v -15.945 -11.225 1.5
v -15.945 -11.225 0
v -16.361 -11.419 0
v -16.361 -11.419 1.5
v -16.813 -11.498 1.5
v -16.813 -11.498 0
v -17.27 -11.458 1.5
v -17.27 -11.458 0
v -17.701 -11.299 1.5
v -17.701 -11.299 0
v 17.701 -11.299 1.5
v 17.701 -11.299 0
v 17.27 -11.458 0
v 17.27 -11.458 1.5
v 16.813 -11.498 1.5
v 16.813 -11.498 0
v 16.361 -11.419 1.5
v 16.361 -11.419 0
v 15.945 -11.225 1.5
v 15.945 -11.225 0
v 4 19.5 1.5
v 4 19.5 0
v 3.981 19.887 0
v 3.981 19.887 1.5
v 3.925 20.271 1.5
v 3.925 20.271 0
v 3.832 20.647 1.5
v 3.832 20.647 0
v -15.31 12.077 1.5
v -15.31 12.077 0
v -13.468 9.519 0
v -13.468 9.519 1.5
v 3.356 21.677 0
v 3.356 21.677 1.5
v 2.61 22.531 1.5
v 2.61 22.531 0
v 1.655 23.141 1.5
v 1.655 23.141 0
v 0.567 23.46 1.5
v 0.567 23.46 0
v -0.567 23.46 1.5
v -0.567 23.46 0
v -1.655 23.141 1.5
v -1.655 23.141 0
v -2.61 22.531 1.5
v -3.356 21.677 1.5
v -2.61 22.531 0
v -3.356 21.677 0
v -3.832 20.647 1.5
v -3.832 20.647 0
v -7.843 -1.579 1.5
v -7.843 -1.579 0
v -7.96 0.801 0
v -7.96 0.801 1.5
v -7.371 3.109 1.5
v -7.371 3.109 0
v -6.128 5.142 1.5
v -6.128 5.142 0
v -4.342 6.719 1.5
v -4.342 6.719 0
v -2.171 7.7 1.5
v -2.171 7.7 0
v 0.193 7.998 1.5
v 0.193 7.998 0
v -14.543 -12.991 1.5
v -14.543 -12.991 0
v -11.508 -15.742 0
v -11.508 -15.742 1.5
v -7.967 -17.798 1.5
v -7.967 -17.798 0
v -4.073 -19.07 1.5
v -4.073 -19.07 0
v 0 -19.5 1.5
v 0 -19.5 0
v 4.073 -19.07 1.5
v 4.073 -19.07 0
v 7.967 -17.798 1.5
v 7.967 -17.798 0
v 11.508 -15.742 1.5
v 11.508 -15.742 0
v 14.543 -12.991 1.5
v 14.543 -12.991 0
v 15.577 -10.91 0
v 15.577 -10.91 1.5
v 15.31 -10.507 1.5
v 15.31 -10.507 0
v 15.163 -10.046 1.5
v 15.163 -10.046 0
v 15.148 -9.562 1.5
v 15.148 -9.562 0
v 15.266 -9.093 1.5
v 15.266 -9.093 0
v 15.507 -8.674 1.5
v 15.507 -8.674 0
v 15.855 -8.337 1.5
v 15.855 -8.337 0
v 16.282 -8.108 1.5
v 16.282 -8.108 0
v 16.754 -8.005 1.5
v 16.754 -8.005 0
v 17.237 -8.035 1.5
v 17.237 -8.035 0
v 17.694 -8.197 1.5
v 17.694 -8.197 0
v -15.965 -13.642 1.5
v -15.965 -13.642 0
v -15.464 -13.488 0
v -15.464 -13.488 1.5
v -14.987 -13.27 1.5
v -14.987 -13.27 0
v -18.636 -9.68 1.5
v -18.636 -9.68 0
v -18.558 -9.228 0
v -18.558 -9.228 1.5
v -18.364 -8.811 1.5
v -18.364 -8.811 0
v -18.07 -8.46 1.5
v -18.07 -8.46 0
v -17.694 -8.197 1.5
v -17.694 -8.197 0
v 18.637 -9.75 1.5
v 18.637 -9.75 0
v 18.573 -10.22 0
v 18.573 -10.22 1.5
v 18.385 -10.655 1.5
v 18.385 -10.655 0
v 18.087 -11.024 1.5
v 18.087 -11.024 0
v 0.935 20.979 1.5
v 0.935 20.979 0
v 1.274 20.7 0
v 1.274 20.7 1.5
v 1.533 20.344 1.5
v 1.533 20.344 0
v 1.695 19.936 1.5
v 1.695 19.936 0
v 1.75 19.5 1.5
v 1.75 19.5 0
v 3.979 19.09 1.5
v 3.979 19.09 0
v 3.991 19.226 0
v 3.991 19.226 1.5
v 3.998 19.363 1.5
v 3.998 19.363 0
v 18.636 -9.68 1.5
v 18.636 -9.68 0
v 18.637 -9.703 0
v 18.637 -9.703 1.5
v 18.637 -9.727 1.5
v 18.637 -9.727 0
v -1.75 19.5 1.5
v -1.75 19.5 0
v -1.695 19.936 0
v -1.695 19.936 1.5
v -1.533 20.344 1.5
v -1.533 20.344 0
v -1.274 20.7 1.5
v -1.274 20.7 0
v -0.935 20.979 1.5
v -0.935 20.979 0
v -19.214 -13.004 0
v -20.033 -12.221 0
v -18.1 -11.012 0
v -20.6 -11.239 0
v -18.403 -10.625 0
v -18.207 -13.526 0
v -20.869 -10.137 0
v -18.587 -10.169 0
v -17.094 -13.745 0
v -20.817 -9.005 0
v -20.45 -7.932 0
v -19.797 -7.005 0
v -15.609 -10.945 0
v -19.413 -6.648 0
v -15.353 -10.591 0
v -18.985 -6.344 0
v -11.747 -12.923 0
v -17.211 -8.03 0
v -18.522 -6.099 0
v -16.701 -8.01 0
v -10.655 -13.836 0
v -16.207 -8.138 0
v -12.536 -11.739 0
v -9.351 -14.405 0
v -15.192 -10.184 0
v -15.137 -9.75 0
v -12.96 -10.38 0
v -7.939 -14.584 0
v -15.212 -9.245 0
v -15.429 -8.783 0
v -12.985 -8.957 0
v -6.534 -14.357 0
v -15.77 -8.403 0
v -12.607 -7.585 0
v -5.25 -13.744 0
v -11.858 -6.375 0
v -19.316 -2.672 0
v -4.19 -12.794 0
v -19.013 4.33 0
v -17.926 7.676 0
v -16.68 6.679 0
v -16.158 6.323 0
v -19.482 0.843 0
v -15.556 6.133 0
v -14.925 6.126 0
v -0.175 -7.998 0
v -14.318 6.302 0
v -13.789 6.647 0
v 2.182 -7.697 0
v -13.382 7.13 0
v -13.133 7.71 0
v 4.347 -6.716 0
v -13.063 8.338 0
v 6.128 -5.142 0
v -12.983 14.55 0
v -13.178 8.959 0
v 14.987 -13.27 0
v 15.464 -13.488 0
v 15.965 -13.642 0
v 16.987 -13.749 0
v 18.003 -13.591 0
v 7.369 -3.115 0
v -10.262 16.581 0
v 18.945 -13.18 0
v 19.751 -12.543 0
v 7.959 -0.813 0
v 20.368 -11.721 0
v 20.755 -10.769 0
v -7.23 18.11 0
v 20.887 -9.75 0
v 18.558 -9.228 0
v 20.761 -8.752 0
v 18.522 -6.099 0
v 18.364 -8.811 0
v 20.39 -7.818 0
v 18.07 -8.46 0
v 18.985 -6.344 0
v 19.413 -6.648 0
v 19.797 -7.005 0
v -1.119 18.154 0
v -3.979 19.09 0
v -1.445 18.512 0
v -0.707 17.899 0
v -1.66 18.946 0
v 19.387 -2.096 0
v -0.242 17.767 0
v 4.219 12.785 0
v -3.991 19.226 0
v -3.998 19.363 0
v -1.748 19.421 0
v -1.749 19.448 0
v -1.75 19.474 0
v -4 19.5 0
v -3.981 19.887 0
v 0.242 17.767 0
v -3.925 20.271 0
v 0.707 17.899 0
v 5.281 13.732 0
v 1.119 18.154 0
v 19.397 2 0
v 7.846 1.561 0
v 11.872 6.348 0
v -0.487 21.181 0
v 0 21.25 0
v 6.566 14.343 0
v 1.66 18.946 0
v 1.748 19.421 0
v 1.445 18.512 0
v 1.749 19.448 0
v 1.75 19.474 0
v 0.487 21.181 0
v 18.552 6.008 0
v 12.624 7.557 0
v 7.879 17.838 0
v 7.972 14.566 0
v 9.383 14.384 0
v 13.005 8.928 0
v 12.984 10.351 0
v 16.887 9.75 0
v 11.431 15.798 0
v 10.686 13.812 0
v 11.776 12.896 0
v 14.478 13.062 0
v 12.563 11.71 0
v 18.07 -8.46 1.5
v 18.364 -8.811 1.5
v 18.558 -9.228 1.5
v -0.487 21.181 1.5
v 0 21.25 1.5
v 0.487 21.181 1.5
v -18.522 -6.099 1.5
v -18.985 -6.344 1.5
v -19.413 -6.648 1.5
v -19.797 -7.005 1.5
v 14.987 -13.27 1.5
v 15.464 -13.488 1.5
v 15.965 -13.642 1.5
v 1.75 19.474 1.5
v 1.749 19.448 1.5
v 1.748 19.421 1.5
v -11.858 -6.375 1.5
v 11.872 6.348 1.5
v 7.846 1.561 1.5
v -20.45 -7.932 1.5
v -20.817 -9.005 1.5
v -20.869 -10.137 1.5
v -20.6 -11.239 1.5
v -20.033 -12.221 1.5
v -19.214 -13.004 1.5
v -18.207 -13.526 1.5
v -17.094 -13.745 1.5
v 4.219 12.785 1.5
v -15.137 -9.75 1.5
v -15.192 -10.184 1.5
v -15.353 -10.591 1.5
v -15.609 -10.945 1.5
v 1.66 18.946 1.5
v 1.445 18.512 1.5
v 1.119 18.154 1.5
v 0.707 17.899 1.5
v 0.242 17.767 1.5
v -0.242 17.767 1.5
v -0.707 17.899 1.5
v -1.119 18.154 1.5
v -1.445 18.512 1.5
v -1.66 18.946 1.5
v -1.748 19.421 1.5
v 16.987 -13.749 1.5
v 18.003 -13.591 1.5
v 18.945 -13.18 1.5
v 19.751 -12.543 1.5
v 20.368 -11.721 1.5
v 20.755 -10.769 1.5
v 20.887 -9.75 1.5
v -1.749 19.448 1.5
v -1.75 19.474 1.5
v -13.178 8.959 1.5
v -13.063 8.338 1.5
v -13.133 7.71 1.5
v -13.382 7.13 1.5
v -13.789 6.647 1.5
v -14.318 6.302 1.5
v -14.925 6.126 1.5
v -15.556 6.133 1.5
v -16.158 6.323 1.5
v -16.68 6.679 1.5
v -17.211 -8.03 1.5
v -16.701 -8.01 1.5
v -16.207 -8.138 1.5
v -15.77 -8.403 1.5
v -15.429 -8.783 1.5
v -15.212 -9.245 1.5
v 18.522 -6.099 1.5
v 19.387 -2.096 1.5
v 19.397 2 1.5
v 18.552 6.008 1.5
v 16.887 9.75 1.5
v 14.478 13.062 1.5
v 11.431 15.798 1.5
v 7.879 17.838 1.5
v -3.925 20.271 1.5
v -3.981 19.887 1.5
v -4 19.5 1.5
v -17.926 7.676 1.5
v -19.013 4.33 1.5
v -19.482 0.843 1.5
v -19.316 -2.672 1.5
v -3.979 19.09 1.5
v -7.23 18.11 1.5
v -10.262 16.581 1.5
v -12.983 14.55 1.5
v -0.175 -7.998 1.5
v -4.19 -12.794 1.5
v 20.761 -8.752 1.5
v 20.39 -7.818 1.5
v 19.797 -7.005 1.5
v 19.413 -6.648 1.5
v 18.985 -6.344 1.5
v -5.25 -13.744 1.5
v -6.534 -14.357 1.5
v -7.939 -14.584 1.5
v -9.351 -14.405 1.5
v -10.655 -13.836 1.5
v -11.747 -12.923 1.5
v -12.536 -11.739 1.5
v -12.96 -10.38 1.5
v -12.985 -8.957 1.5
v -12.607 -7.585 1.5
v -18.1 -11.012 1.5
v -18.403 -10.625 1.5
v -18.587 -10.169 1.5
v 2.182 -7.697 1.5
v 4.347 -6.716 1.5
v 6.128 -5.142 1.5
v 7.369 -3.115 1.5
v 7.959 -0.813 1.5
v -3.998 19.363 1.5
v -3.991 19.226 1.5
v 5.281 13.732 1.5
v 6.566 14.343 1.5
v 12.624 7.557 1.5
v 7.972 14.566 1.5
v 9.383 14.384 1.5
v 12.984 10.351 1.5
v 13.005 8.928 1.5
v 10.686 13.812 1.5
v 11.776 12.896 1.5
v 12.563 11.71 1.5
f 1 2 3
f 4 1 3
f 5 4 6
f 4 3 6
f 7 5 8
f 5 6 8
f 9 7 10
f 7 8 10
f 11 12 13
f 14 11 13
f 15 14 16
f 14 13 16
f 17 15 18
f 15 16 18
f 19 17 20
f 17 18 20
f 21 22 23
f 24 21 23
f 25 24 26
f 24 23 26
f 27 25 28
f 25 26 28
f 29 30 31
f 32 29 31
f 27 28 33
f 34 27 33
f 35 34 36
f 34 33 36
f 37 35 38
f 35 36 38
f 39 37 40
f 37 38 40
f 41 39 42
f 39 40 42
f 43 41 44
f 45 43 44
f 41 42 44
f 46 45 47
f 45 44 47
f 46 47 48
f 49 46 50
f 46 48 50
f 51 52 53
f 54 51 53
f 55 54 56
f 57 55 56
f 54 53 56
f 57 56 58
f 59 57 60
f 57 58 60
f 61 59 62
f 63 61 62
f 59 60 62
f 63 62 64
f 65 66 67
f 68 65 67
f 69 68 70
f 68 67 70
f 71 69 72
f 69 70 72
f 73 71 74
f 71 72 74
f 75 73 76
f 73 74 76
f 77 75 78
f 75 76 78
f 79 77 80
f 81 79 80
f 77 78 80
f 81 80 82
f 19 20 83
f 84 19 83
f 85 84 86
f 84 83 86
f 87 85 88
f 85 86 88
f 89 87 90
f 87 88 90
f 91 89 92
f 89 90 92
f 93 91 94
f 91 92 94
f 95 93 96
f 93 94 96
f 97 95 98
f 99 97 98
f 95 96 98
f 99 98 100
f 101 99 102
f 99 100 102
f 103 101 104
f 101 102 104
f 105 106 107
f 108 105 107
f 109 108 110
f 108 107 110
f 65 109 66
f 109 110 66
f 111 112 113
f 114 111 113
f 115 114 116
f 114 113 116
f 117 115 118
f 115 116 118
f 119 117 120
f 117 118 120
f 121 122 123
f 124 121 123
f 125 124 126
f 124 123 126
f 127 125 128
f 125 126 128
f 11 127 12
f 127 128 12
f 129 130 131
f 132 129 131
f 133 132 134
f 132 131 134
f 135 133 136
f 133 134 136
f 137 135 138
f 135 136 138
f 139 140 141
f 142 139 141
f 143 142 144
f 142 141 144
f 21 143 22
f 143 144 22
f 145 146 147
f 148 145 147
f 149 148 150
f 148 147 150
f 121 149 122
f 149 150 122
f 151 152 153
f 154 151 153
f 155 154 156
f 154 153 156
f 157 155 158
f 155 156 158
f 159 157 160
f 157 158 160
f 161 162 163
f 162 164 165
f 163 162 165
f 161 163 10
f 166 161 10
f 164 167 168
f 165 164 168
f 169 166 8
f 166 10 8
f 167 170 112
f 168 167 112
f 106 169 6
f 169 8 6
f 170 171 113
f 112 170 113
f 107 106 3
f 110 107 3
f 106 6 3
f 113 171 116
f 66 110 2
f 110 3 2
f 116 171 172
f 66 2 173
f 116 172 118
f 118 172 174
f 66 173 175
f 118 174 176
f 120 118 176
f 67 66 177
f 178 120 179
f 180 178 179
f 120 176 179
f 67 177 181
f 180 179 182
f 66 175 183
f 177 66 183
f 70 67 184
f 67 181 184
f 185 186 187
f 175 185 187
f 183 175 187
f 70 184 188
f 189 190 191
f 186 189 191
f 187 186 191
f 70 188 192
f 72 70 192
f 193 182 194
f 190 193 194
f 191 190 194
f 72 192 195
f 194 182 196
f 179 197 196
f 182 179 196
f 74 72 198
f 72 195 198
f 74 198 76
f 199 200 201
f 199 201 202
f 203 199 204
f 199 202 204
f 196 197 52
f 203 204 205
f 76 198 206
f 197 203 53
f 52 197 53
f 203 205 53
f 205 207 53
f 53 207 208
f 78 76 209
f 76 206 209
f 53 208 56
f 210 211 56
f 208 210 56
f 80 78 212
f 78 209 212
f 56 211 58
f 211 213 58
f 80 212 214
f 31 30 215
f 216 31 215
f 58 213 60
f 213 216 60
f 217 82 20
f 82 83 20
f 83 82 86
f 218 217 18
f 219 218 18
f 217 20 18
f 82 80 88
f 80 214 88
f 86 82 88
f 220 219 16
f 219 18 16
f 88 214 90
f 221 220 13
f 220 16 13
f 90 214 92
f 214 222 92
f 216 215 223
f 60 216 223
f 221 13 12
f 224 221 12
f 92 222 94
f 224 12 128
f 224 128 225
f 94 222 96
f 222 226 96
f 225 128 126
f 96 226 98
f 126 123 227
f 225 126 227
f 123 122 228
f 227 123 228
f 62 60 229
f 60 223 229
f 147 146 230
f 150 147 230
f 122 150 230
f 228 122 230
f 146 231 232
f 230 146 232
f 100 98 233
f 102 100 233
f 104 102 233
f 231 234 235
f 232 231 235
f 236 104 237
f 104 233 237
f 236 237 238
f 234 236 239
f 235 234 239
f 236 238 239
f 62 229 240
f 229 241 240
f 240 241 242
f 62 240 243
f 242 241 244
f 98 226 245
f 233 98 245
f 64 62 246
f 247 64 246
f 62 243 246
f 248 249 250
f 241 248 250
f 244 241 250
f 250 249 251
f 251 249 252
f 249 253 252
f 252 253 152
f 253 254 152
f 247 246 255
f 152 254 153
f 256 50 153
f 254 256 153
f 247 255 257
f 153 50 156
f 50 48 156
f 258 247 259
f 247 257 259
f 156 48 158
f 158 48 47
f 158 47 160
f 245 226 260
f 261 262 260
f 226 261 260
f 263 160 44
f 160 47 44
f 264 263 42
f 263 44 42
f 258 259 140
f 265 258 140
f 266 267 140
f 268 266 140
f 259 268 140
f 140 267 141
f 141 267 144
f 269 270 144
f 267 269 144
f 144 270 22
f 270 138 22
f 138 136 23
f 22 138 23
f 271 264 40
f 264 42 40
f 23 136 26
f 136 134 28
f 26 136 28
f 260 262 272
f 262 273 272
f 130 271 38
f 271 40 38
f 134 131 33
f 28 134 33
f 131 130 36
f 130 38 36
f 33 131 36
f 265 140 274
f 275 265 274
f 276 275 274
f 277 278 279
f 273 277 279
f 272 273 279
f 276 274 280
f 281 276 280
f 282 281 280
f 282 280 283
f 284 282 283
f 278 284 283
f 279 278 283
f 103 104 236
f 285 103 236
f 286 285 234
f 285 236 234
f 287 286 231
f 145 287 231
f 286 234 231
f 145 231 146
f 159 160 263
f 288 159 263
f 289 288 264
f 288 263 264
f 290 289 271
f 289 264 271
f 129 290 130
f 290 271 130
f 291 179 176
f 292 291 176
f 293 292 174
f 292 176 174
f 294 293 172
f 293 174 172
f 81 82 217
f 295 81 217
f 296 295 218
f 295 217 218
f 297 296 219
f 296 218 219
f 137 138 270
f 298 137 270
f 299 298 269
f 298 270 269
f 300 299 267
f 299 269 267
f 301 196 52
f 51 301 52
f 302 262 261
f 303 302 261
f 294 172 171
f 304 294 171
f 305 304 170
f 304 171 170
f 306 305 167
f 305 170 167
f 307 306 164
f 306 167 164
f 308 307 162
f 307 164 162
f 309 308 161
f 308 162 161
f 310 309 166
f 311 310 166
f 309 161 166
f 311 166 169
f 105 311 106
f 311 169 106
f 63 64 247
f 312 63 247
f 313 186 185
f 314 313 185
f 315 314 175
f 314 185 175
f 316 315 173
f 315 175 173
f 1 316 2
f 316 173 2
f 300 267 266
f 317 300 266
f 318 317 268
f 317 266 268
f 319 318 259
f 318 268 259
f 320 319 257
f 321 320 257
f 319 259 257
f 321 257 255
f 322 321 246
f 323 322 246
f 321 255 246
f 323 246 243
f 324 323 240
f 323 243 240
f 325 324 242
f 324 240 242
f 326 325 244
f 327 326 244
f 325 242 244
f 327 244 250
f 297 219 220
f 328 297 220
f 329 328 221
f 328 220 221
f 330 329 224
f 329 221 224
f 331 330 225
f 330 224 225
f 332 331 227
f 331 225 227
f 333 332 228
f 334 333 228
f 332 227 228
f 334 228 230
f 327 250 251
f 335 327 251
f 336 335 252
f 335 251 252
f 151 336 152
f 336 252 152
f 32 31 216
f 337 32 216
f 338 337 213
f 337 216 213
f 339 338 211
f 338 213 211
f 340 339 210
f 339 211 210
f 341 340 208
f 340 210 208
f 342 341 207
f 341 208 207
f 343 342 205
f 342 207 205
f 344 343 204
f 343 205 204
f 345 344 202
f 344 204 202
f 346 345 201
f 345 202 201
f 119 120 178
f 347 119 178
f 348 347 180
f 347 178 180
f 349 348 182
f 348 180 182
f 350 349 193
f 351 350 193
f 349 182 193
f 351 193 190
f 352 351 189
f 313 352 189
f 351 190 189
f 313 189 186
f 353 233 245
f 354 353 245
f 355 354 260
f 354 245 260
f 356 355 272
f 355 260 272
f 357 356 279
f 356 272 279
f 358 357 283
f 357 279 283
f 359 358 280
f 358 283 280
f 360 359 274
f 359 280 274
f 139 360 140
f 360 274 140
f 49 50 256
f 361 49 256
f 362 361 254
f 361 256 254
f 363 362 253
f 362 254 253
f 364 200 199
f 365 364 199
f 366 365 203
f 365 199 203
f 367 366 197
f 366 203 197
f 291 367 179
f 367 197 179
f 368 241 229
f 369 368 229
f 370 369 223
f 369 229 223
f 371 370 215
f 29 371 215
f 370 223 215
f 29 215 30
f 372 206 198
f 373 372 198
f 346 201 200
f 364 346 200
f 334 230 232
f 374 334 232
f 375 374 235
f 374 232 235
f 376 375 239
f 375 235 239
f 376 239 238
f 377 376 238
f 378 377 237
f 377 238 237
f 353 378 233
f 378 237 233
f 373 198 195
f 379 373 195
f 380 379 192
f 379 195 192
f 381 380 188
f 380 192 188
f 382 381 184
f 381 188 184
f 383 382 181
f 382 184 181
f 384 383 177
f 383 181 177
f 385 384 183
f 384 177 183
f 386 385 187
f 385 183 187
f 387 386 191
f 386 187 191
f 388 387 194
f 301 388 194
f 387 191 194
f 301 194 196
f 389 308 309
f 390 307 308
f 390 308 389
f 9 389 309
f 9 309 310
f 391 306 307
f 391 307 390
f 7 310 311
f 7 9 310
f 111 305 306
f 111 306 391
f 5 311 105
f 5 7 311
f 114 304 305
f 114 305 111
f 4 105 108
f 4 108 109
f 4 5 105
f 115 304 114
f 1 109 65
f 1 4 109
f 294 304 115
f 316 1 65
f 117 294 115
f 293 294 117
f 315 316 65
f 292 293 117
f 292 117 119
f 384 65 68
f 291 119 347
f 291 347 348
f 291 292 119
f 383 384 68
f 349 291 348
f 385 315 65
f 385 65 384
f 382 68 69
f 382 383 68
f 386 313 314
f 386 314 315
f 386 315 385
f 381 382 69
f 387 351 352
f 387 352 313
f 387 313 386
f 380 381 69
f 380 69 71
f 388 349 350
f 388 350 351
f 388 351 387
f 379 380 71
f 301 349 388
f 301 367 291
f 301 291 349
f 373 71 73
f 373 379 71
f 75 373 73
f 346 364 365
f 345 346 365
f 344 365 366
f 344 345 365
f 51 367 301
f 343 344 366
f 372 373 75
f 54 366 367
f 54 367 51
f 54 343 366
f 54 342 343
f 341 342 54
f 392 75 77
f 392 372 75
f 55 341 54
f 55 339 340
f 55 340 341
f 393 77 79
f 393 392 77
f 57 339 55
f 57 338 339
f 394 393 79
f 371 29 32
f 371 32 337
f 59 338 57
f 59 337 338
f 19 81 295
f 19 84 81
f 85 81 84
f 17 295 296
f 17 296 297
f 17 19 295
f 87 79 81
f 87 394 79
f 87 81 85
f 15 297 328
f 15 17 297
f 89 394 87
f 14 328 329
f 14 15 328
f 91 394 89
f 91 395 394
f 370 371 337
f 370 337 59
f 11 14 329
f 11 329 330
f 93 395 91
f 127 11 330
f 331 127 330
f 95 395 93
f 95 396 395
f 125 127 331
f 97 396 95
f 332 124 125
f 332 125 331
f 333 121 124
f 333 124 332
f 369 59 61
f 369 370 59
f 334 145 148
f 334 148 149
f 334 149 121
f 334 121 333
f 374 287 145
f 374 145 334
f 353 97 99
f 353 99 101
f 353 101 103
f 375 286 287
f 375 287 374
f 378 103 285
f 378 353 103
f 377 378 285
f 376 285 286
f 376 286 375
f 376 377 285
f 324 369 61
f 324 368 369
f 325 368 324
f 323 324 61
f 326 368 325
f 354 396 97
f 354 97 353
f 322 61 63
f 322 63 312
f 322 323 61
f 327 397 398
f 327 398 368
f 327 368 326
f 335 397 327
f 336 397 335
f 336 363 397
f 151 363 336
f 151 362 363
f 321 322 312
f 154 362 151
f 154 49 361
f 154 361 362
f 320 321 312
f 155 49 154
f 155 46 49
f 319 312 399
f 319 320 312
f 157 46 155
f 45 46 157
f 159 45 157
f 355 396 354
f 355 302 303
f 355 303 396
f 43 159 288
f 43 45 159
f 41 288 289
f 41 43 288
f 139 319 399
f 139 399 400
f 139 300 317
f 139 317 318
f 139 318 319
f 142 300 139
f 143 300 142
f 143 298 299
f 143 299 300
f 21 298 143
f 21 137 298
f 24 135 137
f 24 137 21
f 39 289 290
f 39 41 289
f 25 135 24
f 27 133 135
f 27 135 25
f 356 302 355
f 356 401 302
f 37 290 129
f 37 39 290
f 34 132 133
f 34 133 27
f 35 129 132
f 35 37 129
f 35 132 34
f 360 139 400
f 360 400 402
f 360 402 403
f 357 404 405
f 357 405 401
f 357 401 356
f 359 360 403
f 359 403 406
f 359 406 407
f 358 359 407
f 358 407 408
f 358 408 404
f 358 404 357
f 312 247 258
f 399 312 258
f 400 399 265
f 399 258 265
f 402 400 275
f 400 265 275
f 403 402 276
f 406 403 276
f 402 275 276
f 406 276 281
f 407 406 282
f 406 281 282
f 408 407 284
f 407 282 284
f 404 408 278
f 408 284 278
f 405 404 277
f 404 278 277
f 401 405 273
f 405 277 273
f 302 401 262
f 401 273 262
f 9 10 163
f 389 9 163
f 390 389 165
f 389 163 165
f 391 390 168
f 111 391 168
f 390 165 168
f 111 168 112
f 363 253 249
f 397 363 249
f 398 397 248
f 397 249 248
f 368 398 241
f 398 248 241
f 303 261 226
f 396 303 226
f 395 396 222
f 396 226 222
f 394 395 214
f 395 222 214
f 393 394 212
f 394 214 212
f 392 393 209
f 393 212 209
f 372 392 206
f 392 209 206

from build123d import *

# Parameters (mm, degrees)
F1_DEPTH = 1.5


# Not quite as in the source:
# - a feature names something its author has since deleted; it is built from what else it names


with BuildPart() as f1:
    # F0 (on Top) → F1 (new body)
    with BuildSketch(Plane.XY):
        with BuildLine():
            Line((-16.6795244343, 6.6792241971), (-17.9256127972, 7.6760931368))
            ThreePointArc((-17.9256127972, 7.6760931368), (-19.4817711686, 0.8429662711), (-18.5216556944, -6.0990384764))
            ThreePointArc((-18.5216556944, -6.0990384764), (-18.1379825879, -7.1598594707), (-17.6936088333, -8.1967192494))
            ThreePointArc((-17.6936088333, -8.1967192494), (-15.9787045712, -8.2544735786), (-15.1374953738, -9.75))
            ThreePointArc((-15.1374953738, -9.75), (-15.3526962413, -10.5907684717), (-15.9453715143, -11.2247551096))
            ThreePointArc((-15.9453715143, -11.2247551096), (-15.2696114831, -12.1280239592), (-14.5427501065, -12.9907051133))
            ThreePointArc((-14.5427501065, -12.9907051133), (0, -19.5), (14.5427501065, -12.9907051133))
            ThreePointArc((14.5427501065, -12.9907051133), (13.4233937587, -7.75), (18.5216556944, -6.0990384764))
            ThreePointArc((18.5216556944, -6.0990384764), (16.8874953738, 9.75), (3.978905588, 19.0897435897))
            ThreePointArc((3.978905588, 19.0897435897), (0, 15.5), (-3.978905588, 19.0897435897))
            ThreePointArc((-3.978905588, 19.0897435897), (-10.2620358256, 16.5813335023), (-15.3099476357, 12.0770651813))
            Line((-15.3099476357, 12.0770651813), (-13.4680928187, 9.5194474719))
            ThreePointArc((-13.4680928187, 9.5194474719), (-13.7890746093, 6.6466910805), (-16.6795244343, 6.6792241971))
        make_face()
        with BuildLine():
            ThreePointArc((4.2189837175, 12.7847634468), (11.2638316679, 13.3931361584), (11.8722043795, 6.348288208))
            Line((11.8722043795, 6.348288208), (7.846187435, 1.5611991336))
            ThreePointArc((7.846187435, 1.5611991336), (6.128355545, -5.1423008775), (-0.1750048611, -7.9980856021))
            Line((-0.1750048611, -7.9980856021), (-4.1902567902, -12.7942075969))
            ThreePointArc((-4.1902567902, -12.7942075969), (-11.2337204833, -13.4184024423), (-11.8579153287, -6.3749387493))
            Line((-11.8579153287, -6.3749387493), (-7.8426609809, -1.5788187794))
            ThreePointArc((-7.8426609809, -1.5788187794), (-6.128355545, 5.1423008775), (0.1929691871, 7.9976723422))
            Line((0.1929691871, 7.9976723422), (4.2189837175, 12.7847634468))
        make_face(mode=Mode.SUBTRACT)
        with BuildLine():
            ThreePointArc((-17.6936088333, -8.1967192494), (-18.1379825879, -7.1598594707), (-18.5216556944, -6.0990384764))
            ThreePointArc((-18.5216556944, -6.0990384764), (-19.2041408378, -6.4891483024), (-19.7971496554, -7.0052027467))
            ThreePointArc((-19.7971496554, -7.0052027467), (-19.2630878929, -8.3626218874), (-18.6360824437, -9.6796916868))
            ThreePointArc((-18.6360824437, -9.6796916868), (-18.36446034, -8.8113443184), (-17.6936088333, -8.1967192494))
        make_face()
        with BuildLine():
            ThreePointArc((-18.6360824437, -9.6796916868), (-19.2630878929, -8.3626218874), (-19.7971496554, -7.0052027467))
            ThreePointArc((-19.7971496554, -7.0052027467), (-20.3515969889, -11.75), (-15.965258365, -13.6422331507))
            ThreePointArc((-15.965258365, -13.6422331507), (-16.8737869432, -12.5010125269), (-17.7009001234, -11.2994749799))
            ThreePointArc((-17.7009001234, -11.2994749799), (-18.4030398304, -10.625), (-18.6360824437, -9.6796916868))
        make_face()
        with BuildLine():
            ThreePointArc((-14.5427501065, -12.9907051133), (-15.2696114831, -12.1280239592), (-15.9453715143, -11.2247551096))
            ThreePointArc((-15.9453715143, -11.2247551096), (-16.8130781912, -11.498417022), (-17.7009001234, -11.2994749799))
            ThreePointArc((-17.7009001234, -11.2994749799), (-16.8737869432, -12.5010125269), (-15.965258365, -13.6422331507))
            ThreePointArc((-15.965258365, -13.6422331507), (-15.2218376977, -13.3866996722), (-14.5427501065, -12.9907051133))
        make_face()
        with BuildLine():
            ThreePointArc((17.7009001234, -11.2994749799), (16.8737869432, -12.5010125269), (15.965258365, -13.6422331507))
            ThreePointArc((15.965258365, -13.6422331507), (19.3685286228, -12.8875904796), (20.8874953738, -9.75))
            ThreePointArc((20.8874953738, -9.75), (20.6049284348, -8.2732835625), (19.7971496554, -7.0052027467))
            ThreePointArc((19.7971496554, -7.0052027467), (19.2630878929, -8.3626218874), (18.6360824437, -9.6796916868))
            ThreePointArc((18.6360824437, -9.6796916868), (18.6371421056, -9.7148387455), (18.6374953738, -9.75))
            ThreePointArc((18.6374953738, -9.75), (18.3851532639, -10.6552739056), (17.7009001234, -11.2994749799))
        make_face()
        with BuildLine():
            ThreePointArc((14.5427501065, -12.9907051133), (15.2218376977, -13.3866996722), (15.965258365, -13.6422331507))
            ThreePointArc((15.965258365, -13.6422331507), (16.8737869432, -12.5010125269), (17.7009001234, -11.2994749799))
            ThreePointArc((17.7009001234, -11.2994749799), (16.8130781912, -11.498417022), (15.9453715143, -11.2247551096))
            ThreePointArc((15.9453715143, -11.2247551096), (15.2696114831, -12.1280239592), (14.5427501065, -12.9907051133))
        make_face()
        with BuildLine():
            ThreePointArc((-4, 19.5), (-3.994722916, 19.2946008177), (-3.978905588, 19.0897435897))
            ThreePointArc((-3.978905588, 19.0897435897), (-2.8683711048, 19.2878834299), (-1.748237319, 19.421474359))
            ThreePointArc((-1.748237319, 19.421474359), (-1.7495592743, 19.4607272889), (-1.75, 19.5))
            Line((-1.75, 19.5), (-4, 19.5))
        make_face()
        with BuildLine():
            ThreePointArc((-1.748237319, 19.421474359), (-2.8683711048, 19.2878834299), (-3.978905588, 19.0897435897))
            ThreePointArc((-3.978905588, 19.0897435897), (0, 15.5), (3.978905588, 19.0897435897))
            ThreePointArc((3.978905588, 19.0897435897), (2.8683711048, 19.2878834299), (1.748237319, 19.421474359))
            ThreePointArc((1.748237319, 19.421474359), (0, 17.75), (-1.748237319, 19.421474359))
        make_face()
        with BuildLine():
            ThreePointArc((18.5216556944, -6.0990384764), (13.4233937587, -7.75), (14.5427501065, -12.9907051133))
            ThreePointArc((14.5427501065, -12.9907051133), (15.2696114831, -12.1280239592), (15.9453715143, -11.2247551096))
            ThreePointArc((15.9453715143, -11.2247551096), (15.3719509172, -8.875), (17.6936088333, -8.1967192493))
            ThreePointArc((17.6936088333, -8.1967192493), (18.1379825879, -7.1598594707), (18.5216556944, -6.0990384764))
        make_face()
        with BuildLine():
            ThreePointArc((-3.8318912904, 20.6474358974), (-3.9577496865, 20.0798425814), (-4, 19.5))
            Line((-4, 19.5), (-1.75, 19.5))
            ThreePointArc((-1.75, 19.5), (-1.5328191447, 20.3443728263), (-0.9351823203, 20.9791666667))
            ThreePointArc((-0.9351823203, 20.9791666667), (-2.3893009497, 20.8636344143), (-3.8318912904, 20.6474358974))
        make_face()
        with BuildLine():
            ThreePointArc((1.748237319, 19.421474359), (2.8683711048, 19.2878834299), (3.978905588, 19.0897435897))
            ThreePointArc((3.978905588, 19.0897435897), (3.994722916, 19.2946008177), (4, 19.5))
            Line((4, 19.5), (1.75, 19.5))
            ThreePointArc((1.75, 19.5), (1.7495592743, 19.4607272889), (1.748237319, 19.421474359))
        make_face()
        with BuildLine():
            ThreePointArc((3.8318912904, 20.6474358974), (0, 23.5), (-3.8318912904, 20.6474358974))
            ThreePointArc((-3.8318912904, 20.6474358974), (-2.3893009497, 20.8636344143), (-0.9351823203, 20.9791666667))
            ThreePointArc((-0.9351823203, 20.9791666667), (0, 21.25), (0.9351823203, 20.9791666667))
            ThreePointArc((0.9351823203, 20.9791666667), (2.3893009497, 20.8636344143), (3.8318912904, 20.6474358974))
        make_face()
        with BuildLine():
            ThreePointArc((19.7971496554, -7.0052027467), (19.2041408378, -6.4891483024), (18.5216556944, -6.0990384764))
            ThreePointArc((18.5216556944, -6.0990384764), (18.1379825879, -7.1598594707), (17.6936088333, -8.1967192493))
            ThreePointArc((17.6936088333, -8.1967192493), (18.36446034, -8.8113443184), (18.6360824437, -9.6796916868))
            ThreePointArc((18.6360824437, -9.6796916868), (19.2630878929, -8.3626218874), (19.7971496554, -7.0052027467))
        make_face()
        with BuildLine():
            Line((1.75, 19.5), (4, 19.5))
            ThreePointArc((4, 19.5), (3.9577496865, 20.0798425814), (3.8318912904, 20.6474358974))
            ThreePointArc((3.8318912904, 20.6474358974), (2.3893009497, 20.8636344143), (0.9351823203, 20.9791666667))
            ThreePointArc((0.9351823203, 20.9791666667), (1.5328191447, 20.3443728263), (1.75, 19.5))
        make_face()
    extrude(amount=F1_DEPTH)


solid = f1.part
